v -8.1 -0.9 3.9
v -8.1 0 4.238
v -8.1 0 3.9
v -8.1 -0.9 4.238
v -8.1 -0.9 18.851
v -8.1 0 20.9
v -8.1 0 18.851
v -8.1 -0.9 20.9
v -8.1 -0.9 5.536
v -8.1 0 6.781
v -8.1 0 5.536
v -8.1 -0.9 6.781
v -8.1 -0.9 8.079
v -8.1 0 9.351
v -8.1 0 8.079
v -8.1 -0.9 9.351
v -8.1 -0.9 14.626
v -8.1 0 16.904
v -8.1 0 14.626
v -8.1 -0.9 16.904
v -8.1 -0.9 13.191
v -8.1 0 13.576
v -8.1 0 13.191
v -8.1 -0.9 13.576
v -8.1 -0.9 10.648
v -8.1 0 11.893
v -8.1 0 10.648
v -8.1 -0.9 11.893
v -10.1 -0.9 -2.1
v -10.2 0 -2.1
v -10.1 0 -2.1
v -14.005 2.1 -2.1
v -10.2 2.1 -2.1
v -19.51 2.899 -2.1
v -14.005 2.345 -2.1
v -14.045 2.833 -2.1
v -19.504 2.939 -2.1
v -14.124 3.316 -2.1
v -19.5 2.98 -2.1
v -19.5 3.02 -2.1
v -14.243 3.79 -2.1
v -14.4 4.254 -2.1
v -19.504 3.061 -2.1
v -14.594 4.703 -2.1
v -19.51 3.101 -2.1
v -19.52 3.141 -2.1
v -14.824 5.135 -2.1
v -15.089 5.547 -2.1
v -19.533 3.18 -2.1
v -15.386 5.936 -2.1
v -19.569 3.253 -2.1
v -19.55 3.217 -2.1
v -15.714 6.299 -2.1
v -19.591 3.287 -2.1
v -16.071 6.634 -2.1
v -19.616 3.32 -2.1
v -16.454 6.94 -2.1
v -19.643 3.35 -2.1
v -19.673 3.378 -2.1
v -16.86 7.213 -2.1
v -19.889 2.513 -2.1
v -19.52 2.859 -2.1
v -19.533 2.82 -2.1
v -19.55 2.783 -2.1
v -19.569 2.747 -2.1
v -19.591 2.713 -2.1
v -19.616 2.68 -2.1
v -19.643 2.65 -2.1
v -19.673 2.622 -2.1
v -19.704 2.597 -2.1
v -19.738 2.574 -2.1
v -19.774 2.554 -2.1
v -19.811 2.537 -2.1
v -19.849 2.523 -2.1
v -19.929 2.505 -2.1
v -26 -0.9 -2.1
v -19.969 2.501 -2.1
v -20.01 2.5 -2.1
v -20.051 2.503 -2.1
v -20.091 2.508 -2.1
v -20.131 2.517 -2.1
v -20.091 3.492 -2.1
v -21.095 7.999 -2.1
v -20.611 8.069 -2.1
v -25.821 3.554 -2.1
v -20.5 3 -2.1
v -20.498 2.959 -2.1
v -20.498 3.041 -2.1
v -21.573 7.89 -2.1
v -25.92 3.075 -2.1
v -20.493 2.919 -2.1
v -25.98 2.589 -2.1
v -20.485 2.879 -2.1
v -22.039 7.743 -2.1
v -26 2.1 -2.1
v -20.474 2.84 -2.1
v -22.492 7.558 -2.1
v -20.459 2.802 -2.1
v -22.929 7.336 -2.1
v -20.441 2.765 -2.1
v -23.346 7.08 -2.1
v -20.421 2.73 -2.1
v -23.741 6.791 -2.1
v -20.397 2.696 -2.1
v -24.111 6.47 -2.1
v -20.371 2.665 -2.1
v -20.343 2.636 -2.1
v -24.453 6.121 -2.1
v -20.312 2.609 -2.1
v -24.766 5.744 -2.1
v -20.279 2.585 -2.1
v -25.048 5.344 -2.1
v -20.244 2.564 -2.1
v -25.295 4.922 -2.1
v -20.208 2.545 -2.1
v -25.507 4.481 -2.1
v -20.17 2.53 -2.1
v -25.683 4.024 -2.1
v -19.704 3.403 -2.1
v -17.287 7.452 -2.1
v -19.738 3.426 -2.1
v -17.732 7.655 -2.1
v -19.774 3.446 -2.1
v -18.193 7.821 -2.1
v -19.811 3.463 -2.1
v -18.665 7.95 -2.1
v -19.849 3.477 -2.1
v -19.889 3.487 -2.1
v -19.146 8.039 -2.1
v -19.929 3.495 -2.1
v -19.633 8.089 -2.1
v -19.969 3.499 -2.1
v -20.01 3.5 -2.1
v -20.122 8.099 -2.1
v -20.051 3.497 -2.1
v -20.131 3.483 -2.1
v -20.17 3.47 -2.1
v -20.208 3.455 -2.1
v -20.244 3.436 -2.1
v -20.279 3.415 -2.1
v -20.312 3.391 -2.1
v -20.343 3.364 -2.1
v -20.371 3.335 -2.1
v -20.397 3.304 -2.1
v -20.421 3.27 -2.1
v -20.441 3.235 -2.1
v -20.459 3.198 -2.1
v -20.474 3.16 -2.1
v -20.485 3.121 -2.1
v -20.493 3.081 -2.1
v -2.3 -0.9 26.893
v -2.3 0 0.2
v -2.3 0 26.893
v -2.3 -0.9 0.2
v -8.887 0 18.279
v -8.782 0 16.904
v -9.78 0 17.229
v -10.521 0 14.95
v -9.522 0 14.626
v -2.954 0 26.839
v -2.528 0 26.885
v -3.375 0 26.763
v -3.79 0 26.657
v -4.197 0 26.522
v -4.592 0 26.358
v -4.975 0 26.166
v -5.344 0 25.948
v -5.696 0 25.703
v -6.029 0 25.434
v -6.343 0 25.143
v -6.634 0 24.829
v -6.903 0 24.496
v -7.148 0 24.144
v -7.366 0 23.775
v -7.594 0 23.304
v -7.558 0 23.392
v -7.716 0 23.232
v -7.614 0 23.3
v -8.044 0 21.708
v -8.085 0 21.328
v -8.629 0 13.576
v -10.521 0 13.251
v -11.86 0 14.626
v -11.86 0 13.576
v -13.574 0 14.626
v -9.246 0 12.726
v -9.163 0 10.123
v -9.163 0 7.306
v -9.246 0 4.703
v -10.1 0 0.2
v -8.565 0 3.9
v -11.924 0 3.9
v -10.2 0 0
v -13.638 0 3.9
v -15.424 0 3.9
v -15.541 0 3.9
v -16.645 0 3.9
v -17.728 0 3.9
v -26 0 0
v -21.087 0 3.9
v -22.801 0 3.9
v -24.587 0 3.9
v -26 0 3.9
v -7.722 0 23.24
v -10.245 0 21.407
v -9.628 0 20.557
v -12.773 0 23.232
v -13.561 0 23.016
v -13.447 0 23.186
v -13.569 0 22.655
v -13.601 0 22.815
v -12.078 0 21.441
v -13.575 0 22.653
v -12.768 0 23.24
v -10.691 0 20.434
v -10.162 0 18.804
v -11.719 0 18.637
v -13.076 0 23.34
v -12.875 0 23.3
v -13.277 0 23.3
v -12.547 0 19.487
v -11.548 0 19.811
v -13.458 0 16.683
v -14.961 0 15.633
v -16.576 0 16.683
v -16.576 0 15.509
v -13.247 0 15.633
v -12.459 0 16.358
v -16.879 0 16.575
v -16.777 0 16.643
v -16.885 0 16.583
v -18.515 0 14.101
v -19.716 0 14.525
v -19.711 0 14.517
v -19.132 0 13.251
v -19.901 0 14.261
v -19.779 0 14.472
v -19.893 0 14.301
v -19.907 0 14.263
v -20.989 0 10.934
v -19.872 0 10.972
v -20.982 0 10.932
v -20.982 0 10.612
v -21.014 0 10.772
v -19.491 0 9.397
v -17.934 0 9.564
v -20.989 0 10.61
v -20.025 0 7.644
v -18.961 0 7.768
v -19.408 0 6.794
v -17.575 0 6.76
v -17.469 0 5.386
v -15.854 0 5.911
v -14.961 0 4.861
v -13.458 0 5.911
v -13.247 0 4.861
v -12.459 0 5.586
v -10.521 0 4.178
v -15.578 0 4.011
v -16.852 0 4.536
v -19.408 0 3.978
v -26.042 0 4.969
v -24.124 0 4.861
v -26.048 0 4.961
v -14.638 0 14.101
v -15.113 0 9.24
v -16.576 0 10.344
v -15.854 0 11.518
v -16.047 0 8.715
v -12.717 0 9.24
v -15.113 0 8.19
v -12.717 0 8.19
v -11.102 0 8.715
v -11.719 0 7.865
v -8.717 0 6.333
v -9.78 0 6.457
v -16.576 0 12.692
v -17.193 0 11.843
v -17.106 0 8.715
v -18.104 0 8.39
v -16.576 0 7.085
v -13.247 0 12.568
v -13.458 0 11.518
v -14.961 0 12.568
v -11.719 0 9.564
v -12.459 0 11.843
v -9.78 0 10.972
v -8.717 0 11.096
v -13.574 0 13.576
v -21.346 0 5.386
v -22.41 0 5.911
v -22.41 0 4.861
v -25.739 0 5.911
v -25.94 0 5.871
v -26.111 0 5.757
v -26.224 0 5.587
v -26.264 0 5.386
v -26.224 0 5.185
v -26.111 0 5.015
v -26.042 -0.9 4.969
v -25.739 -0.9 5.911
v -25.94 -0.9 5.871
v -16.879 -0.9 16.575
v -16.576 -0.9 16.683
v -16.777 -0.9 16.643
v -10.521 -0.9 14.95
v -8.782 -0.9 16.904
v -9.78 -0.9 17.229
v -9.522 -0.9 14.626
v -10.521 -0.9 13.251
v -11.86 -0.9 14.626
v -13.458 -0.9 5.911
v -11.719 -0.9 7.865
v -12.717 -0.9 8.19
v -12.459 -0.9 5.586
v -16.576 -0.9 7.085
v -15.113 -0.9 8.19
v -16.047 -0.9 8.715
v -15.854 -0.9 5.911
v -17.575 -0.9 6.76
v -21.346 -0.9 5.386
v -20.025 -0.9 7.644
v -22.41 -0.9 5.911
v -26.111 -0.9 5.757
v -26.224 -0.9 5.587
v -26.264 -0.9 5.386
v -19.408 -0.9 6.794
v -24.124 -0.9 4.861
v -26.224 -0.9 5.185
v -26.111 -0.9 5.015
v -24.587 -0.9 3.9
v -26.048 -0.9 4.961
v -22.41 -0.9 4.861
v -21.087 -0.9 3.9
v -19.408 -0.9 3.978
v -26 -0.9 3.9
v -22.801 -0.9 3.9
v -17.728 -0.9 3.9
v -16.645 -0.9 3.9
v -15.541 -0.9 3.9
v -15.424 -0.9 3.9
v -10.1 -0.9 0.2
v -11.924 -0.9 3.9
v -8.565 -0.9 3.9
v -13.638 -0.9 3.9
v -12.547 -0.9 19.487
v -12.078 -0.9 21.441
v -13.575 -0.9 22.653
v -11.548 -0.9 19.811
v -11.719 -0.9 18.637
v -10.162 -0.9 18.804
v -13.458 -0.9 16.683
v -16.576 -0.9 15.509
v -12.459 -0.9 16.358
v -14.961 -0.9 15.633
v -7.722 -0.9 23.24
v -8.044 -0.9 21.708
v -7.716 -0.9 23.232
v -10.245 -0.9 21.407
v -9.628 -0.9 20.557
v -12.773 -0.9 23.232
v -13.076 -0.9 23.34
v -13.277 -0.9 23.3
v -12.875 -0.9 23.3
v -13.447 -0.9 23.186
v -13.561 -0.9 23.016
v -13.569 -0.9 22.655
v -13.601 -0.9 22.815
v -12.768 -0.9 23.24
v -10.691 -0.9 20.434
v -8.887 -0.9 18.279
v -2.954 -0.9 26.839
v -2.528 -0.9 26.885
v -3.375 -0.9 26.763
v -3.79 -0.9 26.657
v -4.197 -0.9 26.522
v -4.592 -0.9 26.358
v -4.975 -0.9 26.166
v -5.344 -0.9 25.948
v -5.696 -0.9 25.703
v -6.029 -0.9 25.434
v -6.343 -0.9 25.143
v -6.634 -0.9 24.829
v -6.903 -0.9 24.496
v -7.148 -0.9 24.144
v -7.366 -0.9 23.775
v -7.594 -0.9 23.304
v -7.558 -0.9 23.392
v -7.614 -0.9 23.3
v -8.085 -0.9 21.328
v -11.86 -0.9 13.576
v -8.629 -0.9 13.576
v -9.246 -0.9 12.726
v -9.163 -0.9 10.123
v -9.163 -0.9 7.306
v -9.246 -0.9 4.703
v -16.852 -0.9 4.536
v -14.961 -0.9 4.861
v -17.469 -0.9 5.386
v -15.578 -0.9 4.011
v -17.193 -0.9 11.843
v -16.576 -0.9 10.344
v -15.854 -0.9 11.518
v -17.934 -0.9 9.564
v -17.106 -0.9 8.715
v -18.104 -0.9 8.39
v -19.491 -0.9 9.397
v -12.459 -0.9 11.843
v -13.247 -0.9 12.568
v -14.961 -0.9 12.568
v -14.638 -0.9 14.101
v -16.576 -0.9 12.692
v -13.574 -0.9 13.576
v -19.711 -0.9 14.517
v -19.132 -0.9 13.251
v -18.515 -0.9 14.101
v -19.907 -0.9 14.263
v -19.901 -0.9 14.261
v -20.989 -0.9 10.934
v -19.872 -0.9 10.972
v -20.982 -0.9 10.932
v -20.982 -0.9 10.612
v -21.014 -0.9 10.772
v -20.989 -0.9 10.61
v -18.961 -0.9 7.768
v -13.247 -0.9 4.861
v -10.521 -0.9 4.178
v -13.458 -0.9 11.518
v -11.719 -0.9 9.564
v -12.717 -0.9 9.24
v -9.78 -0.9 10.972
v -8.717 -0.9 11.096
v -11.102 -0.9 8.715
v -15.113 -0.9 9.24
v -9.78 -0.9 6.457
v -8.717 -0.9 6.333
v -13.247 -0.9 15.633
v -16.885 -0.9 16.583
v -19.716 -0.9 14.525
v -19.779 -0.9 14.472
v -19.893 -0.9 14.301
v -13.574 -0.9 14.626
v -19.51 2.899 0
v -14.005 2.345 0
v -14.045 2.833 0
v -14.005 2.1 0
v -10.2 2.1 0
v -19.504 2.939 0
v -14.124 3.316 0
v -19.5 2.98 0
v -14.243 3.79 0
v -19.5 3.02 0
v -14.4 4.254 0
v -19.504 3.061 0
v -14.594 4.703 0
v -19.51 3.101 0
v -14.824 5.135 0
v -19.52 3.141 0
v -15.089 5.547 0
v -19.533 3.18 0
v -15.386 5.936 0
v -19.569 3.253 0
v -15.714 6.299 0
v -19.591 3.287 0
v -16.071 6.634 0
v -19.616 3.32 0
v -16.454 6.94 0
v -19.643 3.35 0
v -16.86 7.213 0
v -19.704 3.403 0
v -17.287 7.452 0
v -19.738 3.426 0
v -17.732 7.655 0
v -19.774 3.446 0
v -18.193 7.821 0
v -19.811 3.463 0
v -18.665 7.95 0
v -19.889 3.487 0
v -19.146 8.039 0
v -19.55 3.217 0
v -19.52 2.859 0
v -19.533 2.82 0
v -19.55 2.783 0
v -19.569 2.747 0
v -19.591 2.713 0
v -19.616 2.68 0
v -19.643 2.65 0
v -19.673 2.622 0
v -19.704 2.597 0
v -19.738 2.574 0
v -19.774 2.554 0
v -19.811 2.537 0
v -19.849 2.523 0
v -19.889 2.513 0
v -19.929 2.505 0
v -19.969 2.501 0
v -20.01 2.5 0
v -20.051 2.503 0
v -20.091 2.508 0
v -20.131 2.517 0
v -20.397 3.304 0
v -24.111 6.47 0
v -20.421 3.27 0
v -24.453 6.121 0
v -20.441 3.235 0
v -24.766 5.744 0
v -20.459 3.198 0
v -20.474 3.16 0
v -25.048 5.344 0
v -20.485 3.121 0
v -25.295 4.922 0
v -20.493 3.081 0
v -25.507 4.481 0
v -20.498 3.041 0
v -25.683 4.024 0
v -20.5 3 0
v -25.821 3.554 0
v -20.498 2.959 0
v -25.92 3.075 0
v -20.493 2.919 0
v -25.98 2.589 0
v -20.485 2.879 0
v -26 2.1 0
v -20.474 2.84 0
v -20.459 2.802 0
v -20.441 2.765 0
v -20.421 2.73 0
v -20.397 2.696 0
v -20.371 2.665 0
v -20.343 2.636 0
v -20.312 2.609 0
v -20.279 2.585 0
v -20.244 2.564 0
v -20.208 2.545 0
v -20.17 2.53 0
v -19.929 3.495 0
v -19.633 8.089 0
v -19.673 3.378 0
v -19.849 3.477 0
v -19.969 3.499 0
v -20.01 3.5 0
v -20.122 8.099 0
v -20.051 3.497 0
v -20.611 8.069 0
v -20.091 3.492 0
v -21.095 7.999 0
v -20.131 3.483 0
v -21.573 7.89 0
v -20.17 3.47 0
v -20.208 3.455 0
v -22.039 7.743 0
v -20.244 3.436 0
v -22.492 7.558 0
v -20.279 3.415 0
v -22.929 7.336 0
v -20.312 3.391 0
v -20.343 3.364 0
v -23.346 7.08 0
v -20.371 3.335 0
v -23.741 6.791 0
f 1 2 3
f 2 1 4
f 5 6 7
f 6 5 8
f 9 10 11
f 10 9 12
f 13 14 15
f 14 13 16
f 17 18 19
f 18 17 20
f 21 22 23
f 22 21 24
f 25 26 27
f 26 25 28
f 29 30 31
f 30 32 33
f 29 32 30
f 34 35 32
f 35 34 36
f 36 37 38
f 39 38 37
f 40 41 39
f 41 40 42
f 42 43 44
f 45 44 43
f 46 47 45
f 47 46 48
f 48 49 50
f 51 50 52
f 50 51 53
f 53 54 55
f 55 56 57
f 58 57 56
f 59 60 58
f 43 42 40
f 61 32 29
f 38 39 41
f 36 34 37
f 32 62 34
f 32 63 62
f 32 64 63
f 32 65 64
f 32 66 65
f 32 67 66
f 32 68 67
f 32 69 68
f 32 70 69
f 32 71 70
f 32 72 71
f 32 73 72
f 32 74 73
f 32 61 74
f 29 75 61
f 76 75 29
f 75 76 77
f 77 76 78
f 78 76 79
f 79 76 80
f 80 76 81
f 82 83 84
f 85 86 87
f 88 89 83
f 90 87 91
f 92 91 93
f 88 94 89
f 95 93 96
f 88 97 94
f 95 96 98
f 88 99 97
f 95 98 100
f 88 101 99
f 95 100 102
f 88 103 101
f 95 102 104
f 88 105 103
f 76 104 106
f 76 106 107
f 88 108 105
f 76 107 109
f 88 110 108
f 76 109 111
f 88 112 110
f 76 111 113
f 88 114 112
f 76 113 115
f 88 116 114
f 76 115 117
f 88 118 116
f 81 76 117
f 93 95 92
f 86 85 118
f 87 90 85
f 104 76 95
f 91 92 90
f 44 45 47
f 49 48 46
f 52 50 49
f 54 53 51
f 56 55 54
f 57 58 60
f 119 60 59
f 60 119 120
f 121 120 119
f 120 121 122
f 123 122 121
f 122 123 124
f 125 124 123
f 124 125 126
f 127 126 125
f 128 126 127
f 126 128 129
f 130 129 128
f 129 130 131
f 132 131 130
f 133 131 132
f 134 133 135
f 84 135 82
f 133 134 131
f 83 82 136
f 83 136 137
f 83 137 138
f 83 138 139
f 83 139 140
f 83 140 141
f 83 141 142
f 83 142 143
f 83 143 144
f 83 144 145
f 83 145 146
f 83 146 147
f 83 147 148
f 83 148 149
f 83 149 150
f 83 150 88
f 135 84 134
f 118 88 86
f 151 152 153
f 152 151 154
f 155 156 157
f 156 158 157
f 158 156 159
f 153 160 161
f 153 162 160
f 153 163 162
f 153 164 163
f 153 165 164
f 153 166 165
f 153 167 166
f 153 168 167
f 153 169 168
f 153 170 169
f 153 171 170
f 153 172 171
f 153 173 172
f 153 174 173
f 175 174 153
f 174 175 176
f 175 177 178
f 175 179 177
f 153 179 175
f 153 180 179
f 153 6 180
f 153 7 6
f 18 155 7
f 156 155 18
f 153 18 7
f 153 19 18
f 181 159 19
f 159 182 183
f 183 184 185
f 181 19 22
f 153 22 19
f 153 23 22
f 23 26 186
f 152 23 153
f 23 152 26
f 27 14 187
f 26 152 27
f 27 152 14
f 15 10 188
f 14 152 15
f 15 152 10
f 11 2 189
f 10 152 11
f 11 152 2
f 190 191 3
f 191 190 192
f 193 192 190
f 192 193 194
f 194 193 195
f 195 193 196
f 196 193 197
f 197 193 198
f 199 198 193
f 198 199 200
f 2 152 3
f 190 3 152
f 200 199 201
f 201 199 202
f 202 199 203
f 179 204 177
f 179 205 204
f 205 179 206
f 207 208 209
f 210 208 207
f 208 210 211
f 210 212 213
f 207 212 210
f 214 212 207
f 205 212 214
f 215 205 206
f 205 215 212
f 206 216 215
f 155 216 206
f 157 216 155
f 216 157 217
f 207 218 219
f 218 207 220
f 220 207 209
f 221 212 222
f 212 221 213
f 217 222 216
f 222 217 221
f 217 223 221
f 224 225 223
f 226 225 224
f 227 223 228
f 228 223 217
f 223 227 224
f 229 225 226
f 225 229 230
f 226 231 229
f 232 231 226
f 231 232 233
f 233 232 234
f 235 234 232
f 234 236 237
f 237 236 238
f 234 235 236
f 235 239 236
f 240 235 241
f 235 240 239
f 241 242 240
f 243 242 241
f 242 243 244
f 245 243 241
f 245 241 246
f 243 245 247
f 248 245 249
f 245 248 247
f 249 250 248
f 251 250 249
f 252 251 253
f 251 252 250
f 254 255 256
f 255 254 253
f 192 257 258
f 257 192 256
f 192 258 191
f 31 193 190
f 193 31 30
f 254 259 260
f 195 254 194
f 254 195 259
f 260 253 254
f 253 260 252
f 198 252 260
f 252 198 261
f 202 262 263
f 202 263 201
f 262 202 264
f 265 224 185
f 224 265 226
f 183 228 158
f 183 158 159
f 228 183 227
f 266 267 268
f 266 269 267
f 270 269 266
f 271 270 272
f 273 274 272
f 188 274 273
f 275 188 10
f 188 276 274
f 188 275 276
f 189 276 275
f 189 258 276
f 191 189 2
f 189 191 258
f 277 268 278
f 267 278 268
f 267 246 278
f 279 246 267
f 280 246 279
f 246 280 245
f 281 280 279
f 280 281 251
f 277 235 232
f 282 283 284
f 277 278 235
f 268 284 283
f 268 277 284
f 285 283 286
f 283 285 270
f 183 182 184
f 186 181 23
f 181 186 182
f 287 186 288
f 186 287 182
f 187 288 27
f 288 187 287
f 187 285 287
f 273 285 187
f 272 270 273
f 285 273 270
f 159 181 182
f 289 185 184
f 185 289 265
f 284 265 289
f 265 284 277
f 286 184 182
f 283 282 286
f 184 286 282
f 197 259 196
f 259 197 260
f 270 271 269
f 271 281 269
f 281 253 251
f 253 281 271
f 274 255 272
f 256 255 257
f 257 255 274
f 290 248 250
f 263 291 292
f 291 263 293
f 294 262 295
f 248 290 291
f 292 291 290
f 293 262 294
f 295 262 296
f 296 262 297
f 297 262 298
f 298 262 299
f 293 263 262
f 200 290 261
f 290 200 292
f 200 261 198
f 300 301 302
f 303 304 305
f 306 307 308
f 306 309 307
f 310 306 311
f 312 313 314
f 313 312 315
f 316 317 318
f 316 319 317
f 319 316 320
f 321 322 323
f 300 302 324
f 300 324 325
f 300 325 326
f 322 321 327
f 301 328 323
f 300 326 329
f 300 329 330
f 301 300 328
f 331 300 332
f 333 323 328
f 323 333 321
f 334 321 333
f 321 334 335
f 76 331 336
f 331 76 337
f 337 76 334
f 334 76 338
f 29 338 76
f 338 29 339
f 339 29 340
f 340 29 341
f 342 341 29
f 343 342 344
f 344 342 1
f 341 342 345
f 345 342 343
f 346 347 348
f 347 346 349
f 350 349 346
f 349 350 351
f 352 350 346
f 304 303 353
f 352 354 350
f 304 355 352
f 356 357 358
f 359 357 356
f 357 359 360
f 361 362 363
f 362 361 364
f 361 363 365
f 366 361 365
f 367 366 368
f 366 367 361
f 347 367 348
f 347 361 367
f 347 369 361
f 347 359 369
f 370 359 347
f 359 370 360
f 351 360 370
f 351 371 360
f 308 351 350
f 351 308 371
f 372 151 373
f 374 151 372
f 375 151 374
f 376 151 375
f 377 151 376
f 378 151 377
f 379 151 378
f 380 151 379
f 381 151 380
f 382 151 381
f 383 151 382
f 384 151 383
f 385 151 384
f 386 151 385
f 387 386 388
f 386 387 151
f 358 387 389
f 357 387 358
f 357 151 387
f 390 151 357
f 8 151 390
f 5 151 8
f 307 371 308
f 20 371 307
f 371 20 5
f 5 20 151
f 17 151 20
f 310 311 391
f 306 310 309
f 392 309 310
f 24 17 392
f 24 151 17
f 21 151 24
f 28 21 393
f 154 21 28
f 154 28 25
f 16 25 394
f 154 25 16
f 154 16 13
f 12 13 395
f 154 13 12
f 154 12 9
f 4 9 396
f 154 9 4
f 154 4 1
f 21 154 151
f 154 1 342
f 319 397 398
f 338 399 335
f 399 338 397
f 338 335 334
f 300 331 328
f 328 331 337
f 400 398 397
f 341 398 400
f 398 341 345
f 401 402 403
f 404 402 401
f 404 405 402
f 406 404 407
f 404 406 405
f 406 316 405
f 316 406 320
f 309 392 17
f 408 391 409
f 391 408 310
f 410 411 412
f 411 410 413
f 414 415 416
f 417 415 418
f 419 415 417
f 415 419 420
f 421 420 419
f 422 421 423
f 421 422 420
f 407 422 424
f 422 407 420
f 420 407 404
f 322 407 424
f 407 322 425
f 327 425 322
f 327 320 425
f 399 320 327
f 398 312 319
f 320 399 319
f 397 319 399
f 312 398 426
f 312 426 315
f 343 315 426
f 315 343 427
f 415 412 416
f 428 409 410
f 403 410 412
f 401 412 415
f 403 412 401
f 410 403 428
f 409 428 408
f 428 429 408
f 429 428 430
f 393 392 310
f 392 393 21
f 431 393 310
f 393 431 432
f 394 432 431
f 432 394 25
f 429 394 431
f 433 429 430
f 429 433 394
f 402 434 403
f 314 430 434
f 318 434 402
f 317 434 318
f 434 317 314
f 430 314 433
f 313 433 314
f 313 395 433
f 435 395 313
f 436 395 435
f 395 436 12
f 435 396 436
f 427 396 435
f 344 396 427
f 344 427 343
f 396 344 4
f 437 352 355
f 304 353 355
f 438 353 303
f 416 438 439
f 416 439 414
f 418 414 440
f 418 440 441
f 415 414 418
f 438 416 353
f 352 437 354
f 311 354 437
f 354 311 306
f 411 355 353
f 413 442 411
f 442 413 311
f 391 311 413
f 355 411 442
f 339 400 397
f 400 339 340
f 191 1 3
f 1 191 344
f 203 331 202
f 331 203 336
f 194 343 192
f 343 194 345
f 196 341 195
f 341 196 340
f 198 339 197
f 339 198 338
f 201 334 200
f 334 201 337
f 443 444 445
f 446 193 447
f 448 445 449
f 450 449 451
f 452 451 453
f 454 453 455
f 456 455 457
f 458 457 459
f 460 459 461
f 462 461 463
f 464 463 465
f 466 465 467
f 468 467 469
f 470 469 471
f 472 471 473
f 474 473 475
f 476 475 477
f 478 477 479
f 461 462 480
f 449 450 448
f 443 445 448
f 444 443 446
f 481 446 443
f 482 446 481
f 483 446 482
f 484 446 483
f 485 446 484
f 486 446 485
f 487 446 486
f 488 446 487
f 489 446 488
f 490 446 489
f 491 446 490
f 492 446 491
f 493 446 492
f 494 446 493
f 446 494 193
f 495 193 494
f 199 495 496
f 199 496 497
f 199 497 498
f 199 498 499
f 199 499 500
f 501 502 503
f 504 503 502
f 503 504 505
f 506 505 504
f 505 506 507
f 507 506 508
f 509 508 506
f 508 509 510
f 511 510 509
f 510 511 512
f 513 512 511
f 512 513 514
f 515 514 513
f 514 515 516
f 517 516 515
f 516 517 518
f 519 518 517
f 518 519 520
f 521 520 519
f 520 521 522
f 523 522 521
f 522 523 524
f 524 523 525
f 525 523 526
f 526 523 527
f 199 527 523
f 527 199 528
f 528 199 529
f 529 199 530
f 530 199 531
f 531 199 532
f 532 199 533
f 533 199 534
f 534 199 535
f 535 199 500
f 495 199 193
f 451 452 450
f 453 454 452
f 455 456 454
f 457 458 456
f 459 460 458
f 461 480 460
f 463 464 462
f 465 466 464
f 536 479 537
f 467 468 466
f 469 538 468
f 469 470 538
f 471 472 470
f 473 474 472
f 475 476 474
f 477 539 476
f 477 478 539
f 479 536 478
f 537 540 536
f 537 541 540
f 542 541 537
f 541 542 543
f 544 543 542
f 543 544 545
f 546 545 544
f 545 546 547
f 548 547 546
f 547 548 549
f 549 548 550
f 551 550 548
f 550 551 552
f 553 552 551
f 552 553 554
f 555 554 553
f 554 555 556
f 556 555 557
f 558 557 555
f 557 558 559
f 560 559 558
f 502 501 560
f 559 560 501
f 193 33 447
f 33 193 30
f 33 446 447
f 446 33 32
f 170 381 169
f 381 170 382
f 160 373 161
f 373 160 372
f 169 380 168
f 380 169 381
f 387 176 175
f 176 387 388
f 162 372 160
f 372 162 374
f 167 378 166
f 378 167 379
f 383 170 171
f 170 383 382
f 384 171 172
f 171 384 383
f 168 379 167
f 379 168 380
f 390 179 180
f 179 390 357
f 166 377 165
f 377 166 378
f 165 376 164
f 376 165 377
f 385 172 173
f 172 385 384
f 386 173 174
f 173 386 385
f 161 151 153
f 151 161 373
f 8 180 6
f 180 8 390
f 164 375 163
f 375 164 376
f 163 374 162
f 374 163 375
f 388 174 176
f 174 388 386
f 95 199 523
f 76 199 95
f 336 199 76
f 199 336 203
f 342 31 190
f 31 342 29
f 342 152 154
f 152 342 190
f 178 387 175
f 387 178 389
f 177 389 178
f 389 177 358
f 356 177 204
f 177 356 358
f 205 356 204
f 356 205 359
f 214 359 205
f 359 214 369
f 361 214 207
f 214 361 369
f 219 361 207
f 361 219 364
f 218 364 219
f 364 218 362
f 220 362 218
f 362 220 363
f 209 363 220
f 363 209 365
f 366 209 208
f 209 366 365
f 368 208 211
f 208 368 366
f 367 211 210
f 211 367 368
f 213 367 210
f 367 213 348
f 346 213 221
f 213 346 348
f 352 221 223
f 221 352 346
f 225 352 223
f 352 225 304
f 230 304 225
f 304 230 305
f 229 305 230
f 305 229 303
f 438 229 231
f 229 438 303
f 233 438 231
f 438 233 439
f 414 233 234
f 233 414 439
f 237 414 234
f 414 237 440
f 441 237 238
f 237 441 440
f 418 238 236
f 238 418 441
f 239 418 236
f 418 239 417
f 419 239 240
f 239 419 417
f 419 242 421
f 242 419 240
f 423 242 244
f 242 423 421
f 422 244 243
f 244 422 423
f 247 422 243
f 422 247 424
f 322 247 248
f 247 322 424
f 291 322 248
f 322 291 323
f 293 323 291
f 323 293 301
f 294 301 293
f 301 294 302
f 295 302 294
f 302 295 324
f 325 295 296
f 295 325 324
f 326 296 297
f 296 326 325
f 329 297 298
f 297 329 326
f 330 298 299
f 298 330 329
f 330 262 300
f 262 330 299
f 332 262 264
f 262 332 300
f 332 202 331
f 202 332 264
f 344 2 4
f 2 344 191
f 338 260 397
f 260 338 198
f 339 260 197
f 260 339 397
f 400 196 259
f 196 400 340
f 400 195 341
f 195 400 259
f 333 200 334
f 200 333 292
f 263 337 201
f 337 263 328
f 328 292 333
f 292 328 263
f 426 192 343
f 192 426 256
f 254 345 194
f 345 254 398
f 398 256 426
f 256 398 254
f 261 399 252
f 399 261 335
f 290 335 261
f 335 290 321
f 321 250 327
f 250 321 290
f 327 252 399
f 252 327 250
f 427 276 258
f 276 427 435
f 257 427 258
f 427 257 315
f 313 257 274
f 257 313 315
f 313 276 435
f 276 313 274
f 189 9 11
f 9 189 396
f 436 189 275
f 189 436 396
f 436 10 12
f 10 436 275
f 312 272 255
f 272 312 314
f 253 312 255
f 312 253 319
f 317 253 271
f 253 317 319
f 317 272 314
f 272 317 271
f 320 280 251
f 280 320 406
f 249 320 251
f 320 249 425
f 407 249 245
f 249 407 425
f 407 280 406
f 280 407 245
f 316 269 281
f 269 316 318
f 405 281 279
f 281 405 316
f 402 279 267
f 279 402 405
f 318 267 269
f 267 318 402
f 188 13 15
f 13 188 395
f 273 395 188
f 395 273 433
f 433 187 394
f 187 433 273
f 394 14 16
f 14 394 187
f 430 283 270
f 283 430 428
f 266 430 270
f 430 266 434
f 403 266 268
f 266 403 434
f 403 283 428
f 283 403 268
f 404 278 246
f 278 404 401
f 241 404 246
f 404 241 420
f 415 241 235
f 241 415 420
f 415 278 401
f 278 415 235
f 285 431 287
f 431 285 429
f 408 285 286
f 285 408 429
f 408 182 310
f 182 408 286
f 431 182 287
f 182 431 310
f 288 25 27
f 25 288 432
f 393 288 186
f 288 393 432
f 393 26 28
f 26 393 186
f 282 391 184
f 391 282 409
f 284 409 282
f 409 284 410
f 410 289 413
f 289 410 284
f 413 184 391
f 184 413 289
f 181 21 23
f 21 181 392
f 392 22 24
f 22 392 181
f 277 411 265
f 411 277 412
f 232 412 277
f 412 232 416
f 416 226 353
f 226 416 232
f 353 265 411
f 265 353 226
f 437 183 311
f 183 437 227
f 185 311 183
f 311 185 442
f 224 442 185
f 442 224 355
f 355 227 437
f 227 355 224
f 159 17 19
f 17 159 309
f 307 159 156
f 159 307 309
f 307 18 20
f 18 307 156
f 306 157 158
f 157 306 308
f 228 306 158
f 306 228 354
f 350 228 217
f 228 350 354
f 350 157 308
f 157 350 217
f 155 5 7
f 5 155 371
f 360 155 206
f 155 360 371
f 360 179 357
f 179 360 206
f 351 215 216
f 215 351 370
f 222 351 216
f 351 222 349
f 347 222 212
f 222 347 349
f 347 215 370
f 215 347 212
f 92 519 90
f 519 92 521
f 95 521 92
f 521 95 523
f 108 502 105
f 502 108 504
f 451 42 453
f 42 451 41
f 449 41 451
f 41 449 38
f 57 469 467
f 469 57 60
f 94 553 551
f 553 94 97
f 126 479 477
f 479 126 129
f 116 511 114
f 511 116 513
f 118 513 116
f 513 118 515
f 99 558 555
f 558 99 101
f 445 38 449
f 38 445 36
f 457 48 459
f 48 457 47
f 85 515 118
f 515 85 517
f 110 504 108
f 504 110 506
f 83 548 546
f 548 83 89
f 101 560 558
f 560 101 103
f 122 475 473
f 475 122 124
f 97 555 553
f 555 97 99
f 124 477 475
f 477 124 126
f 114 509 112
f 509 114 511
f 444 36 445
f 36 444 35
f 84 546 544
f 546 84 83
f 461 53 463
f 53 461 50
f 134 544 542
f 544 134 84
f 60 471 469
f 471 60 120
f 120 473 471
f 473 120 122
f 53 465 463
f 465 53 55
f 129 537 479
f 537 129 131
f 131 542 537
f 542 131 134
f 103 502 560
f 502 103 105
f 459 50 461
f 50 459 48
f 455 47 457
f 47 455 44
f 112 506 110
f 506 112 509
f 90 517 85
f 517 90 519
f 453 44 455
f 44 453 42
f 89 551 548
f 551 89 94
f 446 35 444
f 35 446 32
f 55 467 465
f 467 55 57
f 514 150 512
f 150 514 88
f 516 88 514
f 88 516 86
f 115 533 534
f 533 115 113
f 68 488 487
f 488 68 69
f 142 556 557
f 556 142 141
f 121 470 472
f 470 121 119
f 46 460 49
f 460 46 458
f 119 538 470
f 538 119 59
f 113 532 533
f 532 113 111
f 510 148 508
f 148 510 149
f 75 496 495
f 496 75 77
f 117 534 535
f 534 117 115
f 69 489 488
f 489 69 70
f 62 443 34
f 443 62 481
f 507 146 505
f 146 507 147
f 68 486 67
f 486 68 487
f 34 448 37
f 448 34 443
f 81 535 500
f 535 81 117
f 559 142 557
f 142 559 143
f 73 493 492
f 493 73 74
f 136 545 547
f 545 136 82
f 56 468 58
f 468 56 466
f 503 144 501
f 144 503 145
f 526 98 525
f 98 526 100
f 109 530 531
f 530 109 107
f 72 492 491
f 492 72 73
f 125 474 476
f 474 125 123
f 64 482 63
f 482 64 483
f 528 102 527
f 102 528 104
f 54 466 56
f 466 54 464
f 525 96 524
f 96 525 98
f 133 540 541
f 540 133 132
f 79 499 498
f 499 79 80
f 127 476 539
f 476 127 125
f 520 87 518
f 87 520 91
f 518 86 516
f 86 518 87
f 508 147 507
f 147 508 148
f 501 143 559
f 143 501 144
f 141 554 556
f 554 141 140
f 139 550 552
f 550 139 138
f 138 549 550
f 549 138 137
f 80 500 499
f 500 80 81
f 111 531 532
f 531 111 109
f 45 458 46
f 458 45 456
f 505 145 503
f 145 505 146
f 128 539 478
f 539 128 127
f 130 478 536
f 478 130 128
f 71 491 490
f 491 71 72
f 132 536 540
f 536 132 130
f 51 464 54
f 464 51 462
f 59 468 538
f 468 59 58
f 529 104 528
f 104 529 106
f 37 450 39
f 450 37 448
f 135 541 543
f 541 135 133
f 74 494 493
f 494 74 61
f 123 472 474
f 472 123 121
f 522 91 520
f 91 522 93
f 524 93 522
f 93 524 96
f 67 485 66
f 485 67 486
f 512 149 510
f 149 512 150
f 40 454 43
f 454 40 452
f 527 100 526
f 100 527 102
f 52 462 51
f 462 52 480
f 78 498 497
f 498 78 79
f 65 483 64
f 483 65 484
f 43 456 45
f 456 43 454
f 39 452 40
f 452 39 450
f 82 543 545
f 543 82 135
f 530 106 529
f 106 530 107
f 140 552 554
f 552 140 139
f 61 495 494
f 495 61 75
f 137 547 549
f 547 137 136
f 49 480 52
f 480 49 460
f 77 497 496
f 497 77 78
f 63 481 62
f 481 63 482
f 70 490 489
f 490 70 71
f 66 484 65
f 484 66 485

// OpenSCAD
// file: ../Parts/rounder.scad
// rounder.scad
// cutting tool for rounding off corners with a cylinder

//---------------------
module rounder(
r=10,   // radius
h=10,   // height
f=22,    // $fn
extra=0.01  // extra size for the cube
){

difference(){
  translate([-extra,-extra,-extra])
  cube([r+extra,r+extra,h+2*extra]);
  translate([r,r,-1])
  cylinder(r=r,h=h+2,$fn=f);
}

}

//---------------------------------------------------------------------------
module bevel(x=1,y=1,h=10){

linear_extrude(height=h)
polygon(points=[[0,0],[x,0],[0,y]]);
    
}
  

//========================

rounder();

//========================
// main file
//=================================================================================
// boxCorners4.scad
//
// For Fairy Crystal storage box.
// Rework to make interlocking parts
//
// Dr Tom Flint, 4 Jan 2023
//
//  -> Shrink the size of the retainer tabs on the rails, then shrink the postBall
//  -> Medium box top can be a single part, should look super clean
//
//=================================================================================

use <../Parts/rounder.scad>
use <../Parts/threads.scad>
use <../Gears/gears.scad>
use <../Fractals/Lsystem.scad>


r1=4;   // radius of knob
$fn=8;

// small box
xbox=76;  
ybox=50.5;  
ztop=25;
zbase=29;
zfoot=10;
baseScale=0.35;
baseWide=0.3;
railThick=2.1;
railWide=6;
panelThick=0.9;
panelCut=-50;
gap=0.1;


//-----------------------------------------------------------------------------------
module top2(){

extra=2.0;

    // front rail
    difference(){
      union(){
        // front rail
        translate([-xbox-railThick,-ybox-railThick, zbase+ztop-railWide+railThick])
        cube([2*xbox+2*railThick,railThick,railWide]);
        translate([-xbox-railThick,-ybox-railThick, zbase+ztop])
        cube([2*xbox+2*railThick,railWide,railThick]);

        // left rail
        translate([-xbox-railThick,-ybox-railThick, zbase+ztop-railWide+railThick])
        cube([railThick,2*ybox+2*railThick,railWide]);
        translate([-xbox-railThick,-ybox-railThick, zbase+ztop])
        cube([railWide,2*ybox+2*railThick,railThick]);
        
        // left front post
        translate([-xbox-railThick,-ybox-railThick, zbase])
        cube([railWide,railThick,ztop-railWide+railThick]);
        translate([-xbox-railThick,-ybox-railThick, zbase])
        cube([railThick,railWide,ztop-railWide+railThick]);

        // right front post
        mirror([1,0,0]){
          translate([-xbox-railThick,-ybox-railThick, zbase])
          cube([railWide,railThick,ztop-railWide+railThick]);
          translate([-xbox-railThick,-ybox-railThick, zbase])
          cube([railThick,railWide,ztop-railWide+railThick]);
        }

        // backside 
        rotate([0,0,180]){
          // front rail
          translate([-xbox-railThick,-ybox-railThick, zbase+ztop-railWide+railThick])
          cube([2*xbox+2*railThick,railThick,railWide]);
          translate([-xbox-railThick,-ybox-railThick, zbase+ztop])
          cube([2*xbox+2*railThick,railWide,railThick]);

          // left rail
          translate([-xbox-railThick,-ybox-railThick, zbase+ztop-railWide+railThick])
          cube([railThick,2*ybox+2*railThick,railWide]);
          translate([-xbox-railThick,-ybox-railThick, zbase+ztop])
          cube([railWide,2*ybox+2*railThick,railThick]);
          
          // left front post
          translate([-xbox-railThick,-ybox-railThick, zbase])
          cube([railWide,railThick,ztop-railWide+railThick]);
          translate([-xbox-railThick,-ybox-railThick, zbase])
          cube([railThick,railWide,ztop-railWide+railThick]);

          // right front post
          mirror([1,0,0]){
            translate([-xbox-railThick,-ybox-railThick, zbase])
            cube([railWide,railThick,ztop-railWide+railThick]);
            translate([-xbox-railThick,-ybox-railThick, zbase])
            cube([railThick,railWide,ztop-railWide+railThick]);
          }
        }
      }
      // front bevel
      translate([-xbox-railThick,-ybox-railThick-railWide, zbase+ztop+1*railThick])
      rotate([-45,0,0])
      cube([2*xbox+2*railThick,railWide,railWide]);

      // left bevel
      translate([-xbox-railThick-railWide,-ybox-railThick, zbase+ztop+1*railThick])
      rotate([0,45,0])
      cube([railWide,2*ybox+2*railThick,railWide]);

      // left front post bevel
      translate([-xbox-1.25*railThick,-ybox-railThick-railWide, zbase-railWide+railThick])
      rotate([0,0,45])
      cube([railWide,railWide,ztop+railWide]);

      // right front post bevel
      mirror([1,0,0]){
        translate([-xbox-1.25*railThick,-ybox-railThick-railWide, zbase-railWide+railThick])
        rotate([0,0,45])
        cube([railWide,railWide,ztop+railWide]);
      }

      rotate([0,0,180]){
        // front bevel
        translate([-xbox-railThick,-ybox-railThick-railWide, zbase+ztop+1*railThick])
        rotate([-45,0,0])
        cube([2*xbox+2*railThick,railWide,railWide]);

        // left bevel
        translate([-xbox-railThick-railWide,-ybox-railThick, zbase+ztop+1*railThick])
        rotate([0,45,0])
        cube([railWide,2*ybox+2*railThick,railWide]);

        // left front post bevel
        translate([-xbox-1.25*railThick,-ybox-railThick-railWide, zbase-railWide+railThick])
        rotate([0,0,45])
        cube([railWide,railWide,ztop+railWide]);

        // right front post bevel
        mirror([1,0,0]){
          translate([-xbox-1.25*railThick,-ybox-railThick-railWide, zbase-railWide+railThick])
          rotate([0,0,45])
          cube([railWide,railWide,ztop+railWide]);
        }
      }
    }      
}    


//-----------------------------------------------------------------------------------
module base1(){
  
  // front left
  postBase();
  panel();
  
  translate([-xbox,-ybox,0])
  rotate([0,0,-90])
  mirror([1,0,0])
  translate([xbox,ybox,0])
  panel();
  
if(1){  
  // front right
  mirror([1,0,0]){
    postBase();
    panel();

    translate([-xbox,-ybox,0])
    rotate([0,0,-90])
    mirror([1,0,0])
    translate([xbox,ybox,0])
    panel();
  }
  
  // rear is rotation of front
  rotate([0,0,180]){
    postBase();
    panel();
    
    translate([-xbox,-ybox,0])
    rotate([0,0,-90])
    mirror([1,0,0])
    translate([xbox,ybox,0])
    panel();
    
    mirror([1,0,0]){
      postBase();
      panel();

      translate([-xbox,-ybox,0])
      rotate([0,0,-90])
      mirror([1,0,0])
      translate([xbox,ybox,0])
      panel();
    }
  }
}

}

//--------------------------------------------------------------------------------------
module postBase(){

gap=0.1;

  difference(){
    union(){
      // post along base
      translate([-xbox-railThick,-ybox-railThick, 0])
      cube([railWide,railThick,zbase]);
      translate([-xbox-railThick,-ybox-railThick, 0])
      cube([railThick,railWide,zbase]);
      // feet
      translate([-xbox-railThick,-ybox-railThick, -zfoot])
      cube([2*railWide,railThick,zfoot]);
      translate([-xbox-railThick,-ybox-railThick, -zfoot])
      cube([railThick,2*railWide,zfoot]);
      // backside fillet
      translate([-xbox,-ybox, -zfoot])
      rotate([0,0,0])
      rounder(r=4,h=zfoot,f=55);
      // nailing tab
      translate([-xbox-railThick,-ybox-railThick,-railThick])
      cube([2*railWide,2*railWide,railThick]);
    }
    // bevel cut
    translate([-xbox-1.0*railThick,-ybox-railThick-railWide, -zfoot-1])
    rotate([0,0,45])
    cube([railWide,railWide,zbase+zfoot+1]);
    // front cut for panels
    translate([-xbox+railThick,-ybox-panelThick-0.1, 0])
    cube([railWide,panelThick+0.1,zbase]);
    // side cut for panels
    translate([-xbox-panelThick-0.1,-ybox+railThick, 0])
    cube([panelThick+0.1,railWide,zbase]);
    // cuts on feet
    translate([-xbox-railThick+2*railWide,-ybox+railThick, -zfoot])
    rotate([90,0,0])
    scale([0.7,1,1])
    cylinder(r=zfoot-railThick,h=10,$fn=99);
    translate([-xbox-2*railThick,-ybox+2*railWide-railThick, -zfoot])
    rotate([0,90,0])
    scale([1,0.7,1])
    cylinder(r=zfoot-railThick,h=10,$fn=99);

    // nailing tab
    translate([-xbox+railThick,-ybox+railThick,-railThick])
    cylinder(r=0.4,h=10,center=true,$fn=44);
    translate([-xbox+2*railWide-railThick,-ybox+2*railWide-railThick,-railThick-1])
    rotate([0,0,180])
    rounder(r=1.5*railWide,h=10,f=66);
  
  }

}

//--------------------------------------------------------------------------------------
module panel(){

  // frame
  difference(){
    union(){
      translate([-xbox+railThick+0.2,-ybox-panelThick, -railThick])
      cube([railWide-0.2,panelThick,zbase]);
      translate([-xbox+railThick+0.2,-ybox-panelThick, -railThick])
      cube([zbase+railThick-0.2,panelThick,railWide]);
      // bottom lip
      translate([-xbox+2*railThick+railWide,-ybox, -railThick])
      cube([zbase+railThick-railWide,railThick,railThick]);
    }
    translate([panelCut,-ybox-10,-railThick-1])
    cube([xbox+panelCut,20,railWide+2]);
    
    translate([-xbox+railWide+railThick,-ybox+1,zbase-railThick])
    rotate([90,0,0])
    rotate([0,0,180])
    rounder(r=railWide,h=10,f=88);
    
    // nailing tab of the post
    translate([-xbox-railThick,-ybox-railThick,-railThick])
    cube([2*railWide+0.2,2*railWide,railThick+0.2]);

  }
  
  // fractal
  intersection(){
    translate([-xbox,-ybox-panelThick,0])
    rotate([-90,0,0])
    linear_extrude(height=panelThick)
    scale([10*baseScale,10*baseScale])
    penrose_tiling(n=4, w=0.3);   // Recommended n <= 6

    translate([-xbox+railWide,-ybox-2*panelThick,railWide-2*railThick])
    cube([zbase-railWide,3*panelThick,zbase-railWide]);
  }

  // tab for nailing
  difference(){
    intersection(){
      translate([-xbox+14,-ybox, -railThick])
      cube([2*railWide,2*railWide,railThick]);
      translate([-xbox+14+railWide,-ybox+railThick, -railThick])
      cylinder(r=railWide,h=railThick,$fn=77);
    }
    translate([-xbox+14+railWide,-ybox+railWide/2, -railThick])
    cylinder(r=0.5,h=3*railThick,$fn=77);
  }
  
}


//-----------------------------------------------------------------------------------
module boxTop(a=0,tol=0){

translate([-xbox-tol,-ybox-tol,zbase-tol])
translate([0,-2,0])
rotate([a,0,0])
translate([0,2,0])
cube([2*xbox+2*tol,2*ybox+2*tol,ztop+2*tol]);

// front latch
translate([0,ybox+5,zbase+15/2])
cube([30,10,15],center=true);

// back hinges
translate([40,-ybox-5,zbase+15/2])
cube([30,5,15],center=true);
translate([-40,-ybox-5,zbase+15/2])
cube([30,5,15],center=true);

}

//-----------------------------------------------------------------------------------
module boxBase(tol=0){

translate([0,0,zbase/2])
cube([2*xbox+2*tol,2*ybox+2*tol,zbase+2*tol],center=true);

// front latch
translate([0,ybox+5,zbase-24/2])
cube([30,10,24],center=true);

// back hinges
translate([40,-ybox-5,zbase-15/2])
cube([30,5,15],center=true);
translate([-40,-ybox-5,zbase-15/2])
cube([30,5,15],center=true);

}

//================================================================================


//railFront();
//railSide();
//postTop();
//postBall();

//color("cyan")
//translate([xbox,ybox,0])
//postBase();
mirror([1,0,0])
translate([xbox,ybox,0])
panel();

if(0){
  color("cyan")
  boxTop(a=0);

  color("green")
  boxBase();
}

if(0){
//  top1();
  top2();
//  base1();
}

//================================================================================
